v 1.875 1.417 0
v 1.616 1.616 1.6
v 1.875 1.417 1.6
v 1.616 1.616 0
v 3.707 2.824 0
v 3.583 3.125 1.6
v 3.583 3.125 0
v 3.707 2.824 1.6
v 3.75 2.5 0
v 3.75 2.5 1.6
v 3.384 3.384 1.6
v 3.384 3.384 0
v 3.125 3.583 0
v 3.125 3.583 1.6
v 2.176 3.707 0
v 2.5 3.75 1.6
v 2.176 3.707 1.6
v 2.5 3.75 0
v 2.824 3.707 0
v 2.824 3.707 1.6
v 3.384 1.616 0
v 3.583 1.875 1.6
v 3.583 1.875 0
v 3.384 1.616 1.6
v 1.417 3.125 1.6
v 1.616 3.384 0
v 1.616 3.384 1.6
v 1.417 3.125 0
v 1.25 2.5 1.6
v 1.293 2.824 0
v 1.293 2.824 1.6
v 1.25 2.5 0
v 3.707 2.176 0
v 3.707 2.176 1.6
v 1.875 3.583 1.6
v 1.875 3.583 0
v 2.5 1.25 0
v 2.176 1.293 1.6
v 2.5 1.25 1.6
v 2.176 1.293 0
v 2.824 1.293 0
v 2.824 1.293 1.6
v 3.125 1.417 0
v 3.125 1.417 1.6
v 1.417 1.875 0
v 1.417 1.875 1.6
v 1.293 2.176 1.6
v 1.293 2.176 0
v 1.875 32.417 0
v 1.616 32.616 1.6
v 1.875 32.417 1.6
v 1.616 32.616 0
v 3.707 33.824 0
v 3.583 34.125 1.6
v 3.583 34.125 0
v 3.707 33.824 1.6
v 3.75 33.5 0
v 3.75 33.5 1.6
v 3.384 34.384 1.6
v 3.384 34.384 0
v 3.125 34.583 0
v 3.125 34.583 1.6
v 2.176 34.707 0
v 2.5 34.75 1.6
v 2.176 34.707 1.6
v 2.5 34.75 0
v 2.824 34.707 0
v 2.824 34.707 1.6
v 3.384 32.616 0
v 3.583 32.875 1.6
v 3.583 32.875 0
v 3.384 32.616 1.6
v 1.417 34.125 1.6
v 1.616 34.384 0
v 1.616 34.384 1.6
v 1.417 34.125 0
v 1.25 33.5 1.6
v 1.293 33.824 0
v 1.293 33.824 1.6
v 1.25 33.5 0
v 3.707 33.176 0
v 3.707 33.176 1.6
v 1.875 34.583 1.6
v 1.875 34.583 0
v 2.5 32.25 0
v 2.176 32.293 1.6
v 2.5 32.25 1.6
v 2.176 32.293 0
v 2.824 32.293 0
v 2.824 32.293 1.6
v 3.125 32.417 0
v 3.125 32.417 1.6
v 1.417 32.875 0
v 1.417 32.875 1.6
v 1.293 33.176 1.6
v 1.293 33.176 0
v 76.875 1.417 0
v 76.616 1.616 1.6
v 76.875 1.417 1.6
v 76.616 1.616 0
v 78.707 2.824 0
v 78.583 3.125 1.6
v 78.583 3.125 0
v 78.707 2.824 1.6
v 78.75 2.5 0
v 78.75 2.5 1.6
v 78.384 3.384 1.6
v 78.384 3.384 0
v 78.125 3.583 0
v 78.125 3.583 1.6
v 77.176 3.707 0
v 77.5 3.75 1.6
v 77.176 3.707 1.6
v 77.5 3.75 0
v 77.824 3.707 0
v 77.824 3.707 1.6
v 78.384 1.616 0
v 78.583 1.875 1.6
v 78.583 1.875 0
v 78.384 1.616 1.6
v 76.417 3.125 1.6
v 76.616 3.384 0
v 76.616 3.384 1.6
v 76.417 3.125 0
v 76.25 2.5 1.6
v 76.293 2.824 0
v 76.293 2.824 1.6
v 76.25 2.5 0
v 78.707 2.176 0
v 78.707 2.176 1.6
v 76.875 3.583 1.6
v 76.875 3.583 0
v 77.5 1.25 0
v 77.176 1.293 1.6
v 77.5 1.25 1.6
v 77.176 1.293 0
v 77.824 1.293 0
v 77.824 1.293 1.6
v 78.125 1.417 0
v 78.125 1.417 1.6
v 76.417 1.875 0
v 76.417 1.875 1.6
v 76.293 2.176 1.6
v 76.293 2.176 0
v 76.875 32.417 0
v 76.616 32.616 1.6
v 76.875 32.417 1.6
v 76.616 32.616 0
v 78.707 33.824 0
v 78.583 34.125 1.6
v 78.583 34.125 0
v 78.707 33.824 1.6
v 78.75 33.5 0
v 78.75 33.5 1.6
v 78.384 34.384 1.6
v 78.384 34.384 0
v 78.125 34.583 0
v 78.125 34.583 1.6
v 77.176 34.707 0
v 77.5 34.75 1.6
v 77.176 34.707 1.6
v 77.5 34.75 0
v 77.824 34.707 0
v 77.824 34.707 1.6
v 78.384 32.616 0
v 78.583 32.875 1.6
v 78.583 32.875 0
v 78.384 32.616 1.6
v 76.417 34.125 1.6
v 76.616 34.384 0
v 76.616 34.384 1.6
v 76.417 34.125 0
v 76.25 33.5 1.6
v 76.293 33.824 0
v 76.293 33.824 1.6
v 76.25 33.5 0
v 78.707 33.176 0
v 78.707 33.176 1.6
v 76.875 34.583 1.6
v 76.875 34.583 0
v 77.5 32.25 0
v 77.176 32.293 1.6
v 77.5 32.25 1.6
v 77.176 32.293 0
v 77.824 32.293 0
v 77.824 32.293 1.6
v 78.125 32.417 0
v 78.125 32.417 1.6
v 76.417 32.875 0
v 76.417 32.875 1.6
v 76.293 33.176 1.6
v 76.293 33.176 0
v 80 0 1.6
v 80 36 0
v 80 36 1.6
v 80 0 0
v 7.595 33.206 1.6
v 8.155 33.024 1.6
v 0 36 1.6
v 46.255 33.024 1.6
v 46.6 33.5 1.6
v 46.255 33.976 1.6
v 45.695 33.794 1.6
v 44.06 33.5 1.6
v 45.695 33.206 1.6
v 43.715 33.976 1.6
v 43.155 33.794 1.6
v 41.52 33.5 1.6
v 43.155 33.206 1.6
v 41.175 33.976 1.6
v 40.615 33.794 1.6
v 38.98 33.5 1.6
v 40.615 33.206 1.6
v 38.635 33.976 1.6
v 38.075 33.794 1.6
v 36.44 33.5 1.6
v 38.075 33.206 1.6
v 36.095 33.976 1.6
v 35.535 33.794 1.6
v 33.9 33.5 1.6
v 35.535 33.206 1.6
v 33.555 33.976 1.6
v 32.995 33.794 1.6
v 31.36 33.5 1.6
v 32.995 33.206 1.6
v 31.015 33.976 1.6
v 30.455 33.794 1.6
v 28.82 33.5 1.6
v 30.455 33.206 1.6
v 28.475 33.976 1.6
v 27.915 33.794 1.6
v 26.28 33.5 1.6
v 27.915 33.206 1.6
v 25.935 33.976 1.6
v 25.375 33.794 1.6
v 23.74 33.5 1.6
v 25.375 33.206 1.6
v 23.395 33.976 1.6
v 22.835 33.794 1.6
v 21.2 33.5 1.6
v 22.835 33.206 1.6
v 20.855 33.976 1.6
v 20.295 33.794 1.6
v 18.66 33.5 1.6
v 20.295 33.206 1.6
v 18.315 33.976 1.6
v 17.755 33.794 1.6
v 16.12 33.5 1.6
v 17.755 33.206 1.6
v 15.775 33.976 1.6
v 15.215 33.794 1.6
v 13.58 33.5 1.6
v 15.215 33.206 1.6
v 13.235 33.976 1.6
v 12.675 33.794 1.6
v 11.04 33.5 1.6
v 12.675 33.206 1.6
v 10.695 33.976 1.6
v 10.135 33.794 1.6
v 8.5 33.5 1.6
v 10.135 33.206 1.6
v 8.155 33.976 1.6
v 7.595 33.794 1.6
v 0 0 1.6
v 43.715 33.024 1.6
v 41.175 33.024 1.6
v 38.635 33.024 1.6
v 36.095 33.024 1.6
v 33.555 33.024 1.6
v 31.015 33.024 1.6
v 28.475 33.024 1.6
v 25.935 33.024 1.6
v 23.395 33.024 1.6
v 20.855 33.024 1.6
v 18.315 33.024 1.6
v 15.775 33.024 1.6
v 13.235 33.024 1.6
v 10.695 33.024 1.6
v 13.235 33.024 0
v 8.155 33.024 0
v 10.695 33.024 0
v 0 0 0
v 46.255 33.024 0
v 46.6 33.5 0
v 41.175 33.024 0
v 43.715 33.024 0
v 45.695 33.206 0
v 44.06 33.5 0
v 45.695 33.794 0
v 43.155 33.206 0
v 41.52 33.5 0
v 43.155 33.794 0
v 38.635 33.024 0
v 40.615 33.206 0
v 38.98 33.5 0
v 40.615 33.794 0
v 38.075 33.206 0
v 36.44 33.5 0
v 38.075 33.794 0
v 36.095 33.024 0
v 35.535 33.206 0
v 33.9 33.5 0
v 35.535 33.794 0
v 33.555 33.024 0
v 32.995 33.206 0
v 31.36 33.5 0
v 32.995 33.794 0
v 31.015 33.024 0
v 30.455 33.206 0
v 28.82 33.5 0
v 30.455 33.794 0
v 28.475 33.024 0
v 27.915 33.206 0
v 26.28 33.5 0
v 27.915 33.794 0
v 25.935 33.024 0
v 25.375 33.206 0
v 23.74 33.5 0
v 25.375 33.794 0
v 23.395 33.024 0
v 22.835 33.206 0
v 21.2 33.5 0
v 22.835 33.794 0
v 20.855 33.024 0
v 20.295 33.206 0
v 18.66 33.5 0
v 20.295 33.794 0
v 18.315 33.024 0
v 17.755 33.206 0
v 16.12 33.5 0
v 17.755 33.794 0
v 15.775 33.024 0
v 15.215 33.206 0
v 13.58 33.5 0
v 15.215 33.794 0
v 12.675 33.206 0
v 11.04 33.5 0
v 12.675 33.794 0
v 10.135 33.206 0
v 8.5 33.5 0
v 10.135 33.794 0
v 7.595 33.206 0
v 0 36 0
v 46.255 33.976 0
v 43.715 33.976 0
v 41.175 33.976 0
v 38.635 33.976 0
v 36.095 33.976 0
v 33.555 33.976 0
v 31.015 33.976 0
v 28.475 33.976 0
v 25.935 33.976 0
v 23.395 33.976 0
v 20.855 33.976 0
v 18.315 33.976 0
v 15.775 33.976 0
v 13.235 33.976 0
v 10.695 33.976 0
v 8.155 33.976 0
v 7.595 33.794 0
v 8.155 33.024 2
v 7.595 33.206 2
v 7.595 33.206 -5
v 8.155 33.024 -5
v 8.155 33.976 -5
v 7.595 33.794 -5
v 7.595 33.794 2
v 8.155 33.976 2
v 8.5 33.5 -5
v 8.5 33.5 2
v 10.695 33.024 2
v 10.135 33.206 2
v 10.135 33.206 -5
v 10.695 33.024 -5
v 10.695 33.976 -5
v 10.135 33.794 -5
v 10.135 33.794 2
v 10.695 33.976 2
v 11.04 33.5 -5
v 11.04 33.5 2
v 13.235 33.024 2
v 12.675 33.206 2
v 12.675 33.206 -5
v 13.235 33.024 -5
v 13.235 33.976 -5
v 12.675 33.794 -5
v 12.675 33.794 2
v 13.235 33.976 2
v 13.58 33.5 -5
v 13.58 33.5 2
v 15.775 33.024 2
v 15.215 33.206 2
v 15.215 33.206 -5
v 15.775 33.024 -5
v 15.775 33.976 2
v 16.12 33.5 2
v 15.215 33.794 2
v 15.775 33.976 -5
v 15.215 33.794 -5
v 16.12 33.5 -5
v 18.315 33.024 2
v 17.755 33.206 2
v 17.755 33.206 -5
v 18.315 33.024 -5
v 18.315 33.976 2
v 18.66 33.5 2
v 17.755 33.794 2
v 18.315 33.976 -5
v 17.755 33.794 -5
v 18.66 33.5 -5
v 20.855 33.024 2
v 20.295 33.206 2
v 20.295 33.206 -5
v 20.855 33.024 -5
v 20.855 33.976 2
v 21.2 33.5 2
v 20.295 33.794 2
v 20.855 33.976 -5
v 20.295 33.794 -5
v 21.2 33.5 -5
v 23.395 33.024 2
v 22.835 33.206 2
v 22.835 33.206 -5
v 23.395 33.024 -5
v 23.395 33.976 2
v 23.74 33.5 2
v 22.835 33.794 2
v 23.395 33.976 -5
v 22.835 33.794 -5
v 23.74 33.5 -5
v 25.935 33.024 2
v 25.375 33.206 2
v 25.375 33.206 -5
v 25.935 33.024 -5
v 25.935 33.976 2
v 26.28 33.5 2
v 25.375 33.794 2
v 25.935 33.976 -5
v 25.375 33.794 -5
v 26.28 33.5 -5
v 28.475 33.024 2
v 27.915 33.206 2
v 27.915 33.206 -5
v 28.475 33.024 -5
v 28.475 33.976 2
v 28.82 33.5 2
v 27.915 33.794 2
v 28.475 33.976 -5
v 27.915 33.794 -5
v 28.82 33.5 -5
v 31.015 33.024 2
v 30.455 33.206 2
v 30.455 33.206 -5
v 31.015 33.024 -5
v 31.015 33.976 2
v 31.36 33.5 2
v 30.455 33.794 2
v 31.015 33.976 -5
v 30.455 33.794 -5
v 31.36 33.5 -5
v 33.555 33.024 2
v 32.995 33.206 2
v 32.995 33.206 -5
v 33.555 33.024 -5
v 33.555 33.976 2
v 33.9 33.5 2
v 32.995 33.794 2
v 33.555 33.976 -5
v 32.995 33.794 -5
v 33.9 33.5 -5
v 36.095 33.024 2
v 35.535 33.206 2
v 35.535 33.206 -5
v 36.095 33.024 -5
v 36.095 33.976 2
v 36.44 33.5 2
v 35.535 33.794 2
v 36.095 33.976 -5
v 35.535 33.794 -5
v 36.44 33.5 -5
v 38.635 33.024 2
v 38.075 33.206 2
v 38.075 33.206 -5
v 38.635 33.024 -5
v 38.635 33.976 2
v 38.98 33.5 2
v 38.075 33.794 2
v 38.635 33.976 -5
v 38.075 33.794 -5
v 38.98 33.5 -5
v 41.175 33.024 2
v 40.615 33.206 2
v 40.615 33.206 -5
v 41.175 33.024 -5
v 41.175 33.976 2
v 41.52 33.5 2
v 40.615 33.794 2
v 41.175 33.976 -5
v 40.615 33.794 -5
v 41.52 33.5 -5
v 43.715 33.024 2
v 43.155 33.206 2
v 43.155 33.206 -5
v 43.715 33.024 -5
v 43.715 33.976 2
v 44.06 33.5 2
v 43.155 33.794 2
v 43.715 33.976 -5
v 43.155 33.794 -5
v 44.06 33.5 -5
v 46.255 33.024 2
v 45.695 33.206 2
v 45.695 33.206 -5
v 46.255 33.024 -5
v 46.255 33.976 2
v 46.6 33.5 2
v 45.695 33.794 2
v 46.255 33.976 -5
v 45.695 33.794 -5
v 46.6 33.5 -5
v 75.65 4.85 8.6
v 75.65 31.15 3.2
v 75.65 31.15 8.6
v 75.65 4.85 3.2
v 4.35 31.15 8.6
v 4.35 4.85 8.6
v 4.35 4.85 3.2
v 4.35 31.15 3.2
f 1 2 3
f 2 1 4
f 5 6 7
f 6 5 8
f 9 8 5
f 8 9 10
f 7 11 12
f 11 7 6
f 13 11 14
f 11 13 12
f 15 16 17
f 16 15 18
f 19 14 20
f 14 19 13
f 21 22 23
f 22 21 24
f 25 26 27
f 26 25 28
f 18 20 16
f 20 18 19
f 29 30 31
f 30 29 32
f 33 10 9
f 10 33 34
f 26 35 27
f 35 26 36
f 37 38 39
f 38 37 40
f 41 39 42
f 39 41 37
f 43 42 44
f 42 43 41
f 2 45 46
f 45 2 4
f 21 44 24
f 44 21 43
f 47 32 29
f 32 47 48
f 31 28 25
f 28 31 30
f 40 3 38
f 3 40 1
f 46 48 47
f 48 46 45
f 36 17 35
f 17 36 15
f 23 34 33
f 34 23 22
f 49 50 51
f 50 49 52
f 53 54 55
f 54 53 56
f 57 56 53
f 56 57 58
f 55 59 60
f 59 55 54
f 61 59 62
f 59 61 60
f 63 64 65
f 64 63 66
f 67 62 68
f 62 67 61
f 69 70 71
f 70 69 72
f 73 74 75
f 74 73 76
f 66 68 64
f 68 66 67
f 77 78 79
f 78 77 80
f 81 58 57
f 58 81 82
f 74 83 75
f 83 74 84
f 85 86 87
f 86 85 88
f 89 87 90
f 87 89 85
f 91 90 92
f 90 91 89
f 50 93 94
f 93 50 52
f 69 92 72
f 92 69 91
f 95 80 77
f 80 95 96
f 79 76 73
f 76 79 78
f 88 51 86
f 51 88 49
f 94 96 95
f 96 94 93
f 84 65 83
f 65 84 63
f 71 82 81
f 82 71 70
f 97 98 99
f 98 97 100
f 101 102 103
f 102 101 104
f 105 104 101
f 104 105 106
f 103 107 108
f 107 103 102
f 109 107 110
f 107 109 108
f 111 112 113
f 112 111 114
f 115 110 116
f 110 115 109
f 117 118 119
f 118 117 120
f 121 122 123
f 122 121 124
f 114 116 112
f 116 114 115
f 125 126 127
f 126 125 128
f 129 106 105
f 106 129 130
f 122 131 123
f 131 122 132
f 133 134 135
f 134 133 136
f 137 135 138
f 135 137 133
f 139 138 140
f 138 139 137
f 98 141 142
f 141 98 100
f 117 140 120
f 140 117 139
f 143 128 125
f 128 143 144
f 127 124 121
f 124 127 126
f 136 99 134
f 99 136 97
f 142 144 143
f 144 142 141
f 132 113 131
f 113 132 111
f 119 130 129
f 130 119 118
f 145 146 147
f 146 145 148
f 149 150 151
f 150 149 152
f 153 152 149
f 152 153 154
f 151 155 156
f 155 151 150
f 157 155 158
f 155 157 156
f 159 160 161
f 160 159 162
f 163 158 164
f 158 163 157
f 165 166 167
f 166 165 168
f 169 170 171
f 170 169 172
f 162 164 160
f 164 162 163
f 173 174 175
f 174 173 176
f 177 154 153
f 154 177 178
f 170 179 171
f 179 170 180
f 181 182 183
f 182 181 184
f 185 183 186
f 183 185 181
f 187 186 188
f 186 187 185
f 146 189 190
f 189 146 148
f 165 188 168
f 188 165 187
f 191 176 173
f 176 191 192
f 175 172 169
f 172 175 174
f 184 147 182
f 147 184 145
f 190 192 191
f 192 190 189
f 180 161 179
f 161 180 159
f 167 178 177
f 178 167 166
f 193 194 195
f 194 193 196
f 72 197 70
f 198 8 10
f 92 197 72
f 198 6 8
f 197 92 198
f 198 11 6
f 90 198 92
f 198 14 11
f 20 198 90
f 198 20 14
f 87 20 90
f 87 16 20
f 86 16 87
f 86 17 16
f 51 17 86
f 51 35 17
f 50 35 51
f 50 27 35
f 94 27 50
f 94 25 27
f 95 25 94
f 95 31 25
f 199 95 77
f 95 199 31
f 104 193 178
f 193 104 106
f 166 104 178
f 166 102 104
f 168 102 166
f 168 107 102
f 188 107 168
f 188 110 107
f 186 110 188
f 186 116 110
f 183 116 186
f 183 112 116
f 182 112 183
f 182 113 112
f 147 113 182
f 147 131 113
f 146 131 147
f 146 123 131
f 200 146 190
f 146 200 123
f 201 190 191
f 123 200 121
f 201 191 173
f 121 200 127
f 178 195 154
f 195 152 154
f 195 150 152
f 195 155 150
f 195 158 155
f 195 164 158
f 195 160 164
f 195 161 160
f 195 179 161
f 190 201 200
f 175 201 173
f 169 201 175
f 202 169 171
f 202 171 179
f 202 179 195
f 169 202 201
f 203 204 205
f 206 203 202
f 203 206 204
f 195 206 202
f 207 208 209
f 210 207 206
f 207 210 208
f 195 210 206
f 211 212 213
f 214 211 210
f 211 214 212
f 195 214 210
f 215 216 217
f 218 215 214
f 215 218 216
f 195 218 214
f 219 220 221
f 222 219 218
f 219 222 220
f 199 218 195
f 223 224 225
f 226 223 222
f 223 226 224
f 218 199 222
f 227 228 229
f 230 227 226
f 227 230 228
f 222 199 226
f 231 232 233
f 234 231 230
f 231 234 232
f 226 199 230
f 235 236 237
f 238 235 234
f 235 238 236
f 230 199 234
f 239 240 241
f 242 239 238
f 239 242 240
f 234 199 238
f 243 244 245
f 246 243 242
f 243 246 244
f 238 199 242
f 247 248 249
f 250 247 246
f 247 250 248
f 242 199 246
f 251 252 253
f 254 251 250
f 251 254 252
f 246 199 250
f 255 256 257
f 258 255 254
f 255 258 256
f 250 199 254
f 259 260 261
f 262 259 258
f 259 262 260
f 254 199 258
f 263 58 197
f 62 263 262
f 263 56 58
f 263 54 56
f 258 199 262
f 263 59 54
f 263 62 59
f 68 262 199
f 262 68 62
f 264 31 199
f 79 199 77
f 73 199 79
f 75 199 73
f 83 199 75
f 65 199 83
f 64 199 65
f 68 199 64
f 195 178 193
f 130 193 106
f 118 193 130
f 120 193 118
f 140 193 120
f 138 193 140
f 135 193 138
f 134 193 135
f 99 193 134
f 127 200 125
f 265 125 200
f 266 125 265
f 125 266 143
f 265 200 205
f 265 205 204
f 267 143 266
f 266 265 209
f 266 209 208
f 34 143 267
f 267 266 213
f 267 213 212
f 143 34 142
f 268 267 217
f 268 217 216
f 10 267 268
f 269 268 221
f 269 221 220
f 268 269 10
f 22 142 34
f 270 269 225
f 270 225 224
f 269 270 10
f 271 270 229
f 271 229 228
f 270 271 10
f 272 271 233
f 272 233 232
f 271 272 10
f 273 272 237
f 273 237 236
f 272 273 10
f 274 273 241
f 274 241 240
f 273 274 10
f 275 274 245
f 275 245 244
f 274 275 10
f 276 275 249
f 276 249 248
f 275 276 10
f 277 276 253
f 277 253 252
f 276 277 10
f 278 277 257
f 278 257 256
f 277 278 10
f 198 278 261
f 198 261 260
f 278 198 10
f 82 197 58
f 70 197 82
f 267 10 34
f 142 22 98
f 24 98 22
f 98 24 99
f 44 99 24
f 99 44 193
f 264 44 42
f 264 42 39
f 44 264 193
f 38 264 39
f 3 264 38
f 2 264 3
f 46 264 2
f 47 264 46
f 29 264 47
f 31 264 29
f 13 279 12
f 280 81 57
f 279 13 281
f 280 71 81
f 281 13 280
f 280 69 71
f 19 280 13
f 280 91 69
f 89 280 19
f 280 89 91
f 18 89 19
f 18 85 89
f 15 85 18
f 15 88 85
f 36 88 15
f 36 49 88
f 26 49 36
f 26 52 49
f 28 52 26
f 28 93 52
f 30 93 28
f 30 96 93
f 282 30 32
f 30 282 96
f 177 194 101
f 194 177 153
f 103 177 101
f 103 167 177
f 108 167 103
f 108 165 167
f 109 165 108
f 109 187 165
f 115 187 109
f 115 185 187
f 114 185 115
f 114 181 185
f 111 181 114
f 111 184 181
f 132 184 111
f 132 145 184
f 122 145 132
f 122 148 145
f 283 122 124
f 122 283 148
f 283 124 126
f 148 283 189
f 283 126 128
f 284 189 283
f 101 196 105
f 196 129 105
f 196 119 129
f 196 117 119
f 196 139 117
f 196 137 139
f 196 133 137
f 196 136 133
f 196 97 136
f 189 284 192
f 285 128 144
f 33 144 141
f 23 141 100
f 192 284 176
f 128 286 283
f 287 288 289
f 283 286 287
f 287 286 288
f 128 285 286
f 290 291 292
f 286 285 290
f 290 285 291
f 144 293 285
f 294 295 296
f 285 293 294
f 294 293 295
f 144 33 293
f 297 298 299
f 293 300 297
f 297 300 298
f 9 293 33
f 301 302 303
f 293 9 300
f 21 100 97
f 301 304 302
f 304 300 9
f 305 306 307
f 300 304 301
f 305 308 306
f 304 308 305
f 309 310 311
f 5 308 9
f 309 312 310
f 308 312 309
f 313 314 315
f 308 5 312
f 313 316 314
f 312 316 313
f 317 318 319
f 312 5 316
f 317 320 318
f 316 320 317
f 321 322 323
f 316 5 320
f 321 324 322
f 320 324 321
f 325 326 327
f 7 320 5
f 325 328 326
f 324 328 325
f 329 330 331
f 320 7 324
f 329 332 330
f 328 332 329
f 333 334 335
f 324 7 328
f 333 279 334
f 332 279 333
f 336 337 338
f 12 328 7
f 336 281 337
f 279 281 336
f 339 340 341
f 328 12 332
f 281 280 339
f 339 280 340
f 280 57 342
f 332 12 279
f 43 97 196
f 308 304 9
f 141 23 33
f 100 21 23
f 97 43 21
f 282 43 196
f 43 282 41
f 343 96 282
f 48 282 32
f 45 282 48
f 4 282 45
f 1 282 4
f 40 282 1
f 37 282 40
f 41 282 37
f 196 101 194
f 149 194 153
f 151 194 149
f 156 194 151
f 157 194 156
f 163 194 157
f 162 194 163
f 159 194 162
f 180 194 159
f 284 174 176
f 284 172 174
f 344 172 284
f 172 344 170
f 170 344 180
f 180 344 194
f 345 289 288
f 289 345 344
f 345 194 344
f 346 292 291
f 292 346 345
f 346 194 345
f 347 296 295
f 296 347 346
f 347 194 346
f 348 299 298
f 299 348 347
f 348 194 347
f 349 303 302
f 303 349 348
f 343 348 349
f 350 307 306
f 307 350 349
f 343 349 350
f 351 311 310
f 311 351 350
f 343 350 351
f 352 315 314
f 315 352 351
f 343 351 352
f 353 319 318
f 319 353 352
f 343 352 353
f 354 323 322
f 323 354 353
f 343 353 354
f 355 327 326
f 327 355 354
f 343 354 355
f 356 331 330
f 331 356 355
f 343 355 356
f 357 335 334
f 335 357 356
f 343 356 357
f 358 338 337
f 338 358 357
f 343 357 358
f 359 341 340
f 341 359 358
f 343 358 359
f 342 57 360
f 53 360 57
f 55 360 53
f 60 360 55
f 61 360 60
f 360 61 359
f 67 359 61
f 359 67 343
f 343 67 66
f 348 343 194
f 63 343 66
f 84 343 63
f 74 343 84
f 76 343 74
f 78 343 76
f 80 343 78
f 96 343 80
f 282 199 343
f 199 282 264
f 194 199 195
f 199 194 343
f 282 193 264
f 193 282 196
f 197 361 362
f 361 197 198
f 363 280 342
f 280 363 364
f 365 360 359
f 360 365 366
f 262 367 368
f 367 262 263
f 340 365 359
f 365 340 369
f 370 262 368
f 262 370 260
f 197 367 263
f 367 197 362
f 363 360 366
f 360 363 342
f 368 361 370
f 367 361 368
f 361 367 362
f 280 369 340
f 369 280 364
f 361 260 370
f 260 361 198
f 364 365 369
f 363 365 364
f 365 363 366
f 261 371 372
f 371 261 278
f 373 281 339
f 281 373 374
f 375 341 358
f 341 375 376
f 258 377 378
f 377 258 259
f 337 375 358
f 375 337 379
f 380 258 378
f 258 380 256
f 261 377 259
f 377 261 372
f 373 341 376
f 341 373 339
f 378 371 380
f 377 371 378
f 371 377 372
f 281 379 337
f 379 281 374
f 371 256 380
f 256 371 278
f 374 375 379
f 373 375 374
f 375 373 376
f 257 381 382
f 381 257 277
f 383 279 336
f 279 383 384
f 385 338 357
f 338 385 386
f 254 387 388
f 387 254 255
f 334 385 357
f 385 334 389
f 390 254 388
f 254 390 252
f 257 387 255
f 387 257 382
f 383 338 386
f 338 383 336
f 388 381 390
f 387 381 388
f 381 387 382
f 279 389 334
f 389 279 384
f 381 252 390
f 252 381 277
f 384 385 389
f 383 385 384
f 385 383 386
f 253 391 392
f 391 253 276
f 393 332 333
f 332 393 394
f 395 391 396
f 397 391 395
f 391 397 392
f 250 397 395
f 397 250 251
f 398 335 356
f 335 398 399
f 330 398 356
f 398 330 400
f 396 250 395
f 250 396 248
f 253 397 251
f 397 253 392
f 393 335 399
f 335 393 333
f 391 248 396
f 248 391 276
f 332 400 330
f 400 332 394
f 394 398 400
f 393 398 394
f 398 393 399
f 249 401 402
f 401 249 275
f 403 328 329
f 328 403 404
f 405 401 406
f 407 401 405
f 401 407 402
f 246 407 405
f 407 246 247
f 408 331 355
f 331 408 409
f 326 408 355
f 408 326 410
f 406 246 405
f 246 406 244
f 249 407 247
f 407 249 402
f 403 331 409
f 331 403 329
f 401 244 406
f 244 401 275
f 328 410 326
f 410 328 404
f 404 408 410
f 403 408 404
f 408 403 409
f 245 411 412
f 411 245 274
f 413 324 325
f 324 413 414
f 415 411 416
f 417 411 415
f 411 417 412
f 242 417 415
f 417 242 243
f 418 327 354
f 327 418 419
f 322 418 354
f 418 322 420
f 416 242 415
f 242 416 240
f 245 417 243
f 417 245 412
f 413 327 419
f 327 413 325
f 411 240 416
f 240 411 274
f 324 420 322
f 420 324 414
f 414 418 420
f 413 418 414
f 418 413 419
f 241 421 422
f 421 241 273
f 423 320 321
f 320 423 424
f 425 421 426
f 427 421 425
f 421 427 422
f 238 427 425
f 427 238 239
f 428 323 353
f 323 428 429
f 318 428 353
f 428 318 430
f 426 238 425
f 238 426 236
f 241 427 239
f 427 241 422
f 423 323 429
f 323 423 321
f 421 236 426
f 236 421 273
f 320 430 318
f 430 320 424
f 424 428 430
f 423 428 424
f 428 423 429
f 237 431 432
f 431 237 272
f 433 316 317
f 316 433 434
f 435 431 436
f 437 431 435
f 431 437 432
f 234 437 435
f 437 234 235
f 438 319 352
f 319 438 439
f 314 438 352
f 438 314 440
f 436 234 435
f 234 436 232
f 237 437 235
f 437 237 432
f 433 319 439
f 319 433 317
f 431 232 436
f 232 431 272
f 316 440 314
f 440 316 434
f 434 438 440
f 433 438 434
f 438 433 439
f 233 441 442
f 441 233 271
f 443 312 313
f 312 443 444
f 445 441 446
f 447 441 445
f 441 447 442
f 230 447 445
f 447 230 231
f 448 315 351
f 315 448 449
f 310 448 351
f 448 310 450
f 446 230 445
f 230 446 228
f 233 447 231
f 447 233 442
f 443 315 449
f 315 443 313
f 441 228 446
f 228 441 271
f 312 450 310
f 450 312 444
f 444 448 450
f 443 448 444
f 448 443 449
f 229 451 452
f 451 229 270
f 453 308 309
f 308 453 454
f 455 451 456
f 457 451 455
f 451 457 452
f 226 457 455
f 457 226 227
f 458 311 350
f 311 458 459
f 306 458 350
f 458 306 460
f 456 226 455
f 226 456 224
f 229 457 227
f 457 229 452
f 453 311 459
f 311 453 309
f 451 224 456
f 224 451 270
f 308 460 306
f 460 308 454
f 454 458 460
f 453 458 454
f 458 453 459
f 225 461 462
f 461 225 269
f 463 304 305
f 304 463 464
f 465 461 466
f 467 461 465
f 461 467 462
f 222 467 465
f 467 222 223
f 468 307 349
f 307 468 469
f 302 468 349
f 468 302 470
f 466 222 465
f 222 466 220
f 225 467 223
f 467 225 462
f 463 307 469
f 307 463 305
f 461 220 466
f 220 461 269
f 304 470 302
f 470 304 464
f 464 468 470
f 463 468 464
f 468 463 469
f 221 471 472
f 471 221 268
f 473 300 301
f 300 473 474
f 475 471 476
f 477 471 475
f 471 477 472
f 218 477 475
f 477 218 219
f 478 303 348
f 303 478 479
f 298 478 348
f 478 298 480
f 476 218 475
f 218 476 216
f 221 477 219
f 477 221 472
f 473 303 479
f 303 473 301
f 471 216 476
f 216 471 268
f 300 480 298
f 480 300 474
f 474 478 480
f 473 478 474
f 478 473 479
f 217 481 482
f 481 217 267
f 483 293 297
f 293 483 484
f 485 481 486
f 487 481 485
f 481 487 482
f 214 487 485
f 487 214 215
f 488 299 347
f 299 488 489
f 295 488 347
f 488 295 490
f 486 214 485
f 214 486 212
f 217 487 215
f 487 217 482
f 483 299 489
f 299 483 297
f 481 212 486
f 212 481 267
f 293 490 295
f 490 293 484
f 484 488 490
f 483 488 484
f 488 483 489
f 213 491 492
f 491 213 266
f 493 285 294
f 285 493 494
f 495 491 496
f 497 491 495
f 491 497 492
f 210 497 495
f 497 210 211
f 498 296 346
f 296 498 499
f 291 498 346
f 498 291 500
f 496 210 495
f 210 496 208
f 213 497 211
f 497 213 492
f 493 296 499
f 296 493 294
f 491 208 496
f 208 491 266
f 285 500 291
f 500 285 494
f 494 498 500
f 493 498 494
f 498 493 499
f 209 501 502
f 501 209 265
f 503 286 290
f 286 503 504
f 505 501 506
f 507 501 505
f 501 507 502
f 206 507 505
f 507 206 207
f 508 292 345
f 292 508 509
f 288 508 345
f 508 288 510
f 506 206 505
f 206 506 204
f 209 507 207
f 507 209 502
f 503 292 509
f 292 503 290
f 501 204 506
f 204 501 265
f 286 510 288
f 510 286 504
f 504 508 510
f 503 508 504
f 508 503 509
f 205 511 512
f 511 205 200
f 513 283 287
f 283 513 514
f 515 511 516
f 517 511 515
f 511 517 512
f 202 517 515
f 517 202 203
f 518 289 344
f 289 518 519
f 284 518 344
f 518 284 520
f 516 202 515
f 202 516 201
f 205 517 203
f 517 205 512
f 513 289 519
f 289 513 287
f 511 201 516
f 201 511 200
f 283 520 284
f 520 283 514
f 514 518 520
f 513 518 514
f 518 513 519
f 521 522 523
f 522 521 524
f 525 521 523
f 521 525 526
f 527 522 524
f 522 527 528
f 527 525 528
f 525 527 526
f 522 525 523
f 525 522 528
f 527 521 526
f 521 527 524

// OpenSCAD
// PCB with mounting holes
difference() {
  color("#006020")  cube([80,36,1.6]);
  translate( [0, 0, -0.1]) {
    $fn = 24;
    translate( [2.5, 2.5, 0])  cylinder( d=2.5, h=1.8);
    translate( [2.5, 36-2.5, 0])  cylinder( d=2.5, h=1.8);
    translate( [80-2.5, 2.5, 0])  cylinder( d=2.5, h=1.8);
    translate( [80-2.5, 36-2.5, 0])  cylinder( d=2.5, h=1.8);
  }
}
// display body
translate([4.35, 4.85, 3.2]) color("grey") cube([71.3, 26.3, 5.4]);
// connector pins
translate( [8, 36-2.5, -5]) {
  for( i=[0:15]) {
    translate( [i*2.54, 0, 0])
    cylinder( d=1.0,h=7);
  }
}

    
